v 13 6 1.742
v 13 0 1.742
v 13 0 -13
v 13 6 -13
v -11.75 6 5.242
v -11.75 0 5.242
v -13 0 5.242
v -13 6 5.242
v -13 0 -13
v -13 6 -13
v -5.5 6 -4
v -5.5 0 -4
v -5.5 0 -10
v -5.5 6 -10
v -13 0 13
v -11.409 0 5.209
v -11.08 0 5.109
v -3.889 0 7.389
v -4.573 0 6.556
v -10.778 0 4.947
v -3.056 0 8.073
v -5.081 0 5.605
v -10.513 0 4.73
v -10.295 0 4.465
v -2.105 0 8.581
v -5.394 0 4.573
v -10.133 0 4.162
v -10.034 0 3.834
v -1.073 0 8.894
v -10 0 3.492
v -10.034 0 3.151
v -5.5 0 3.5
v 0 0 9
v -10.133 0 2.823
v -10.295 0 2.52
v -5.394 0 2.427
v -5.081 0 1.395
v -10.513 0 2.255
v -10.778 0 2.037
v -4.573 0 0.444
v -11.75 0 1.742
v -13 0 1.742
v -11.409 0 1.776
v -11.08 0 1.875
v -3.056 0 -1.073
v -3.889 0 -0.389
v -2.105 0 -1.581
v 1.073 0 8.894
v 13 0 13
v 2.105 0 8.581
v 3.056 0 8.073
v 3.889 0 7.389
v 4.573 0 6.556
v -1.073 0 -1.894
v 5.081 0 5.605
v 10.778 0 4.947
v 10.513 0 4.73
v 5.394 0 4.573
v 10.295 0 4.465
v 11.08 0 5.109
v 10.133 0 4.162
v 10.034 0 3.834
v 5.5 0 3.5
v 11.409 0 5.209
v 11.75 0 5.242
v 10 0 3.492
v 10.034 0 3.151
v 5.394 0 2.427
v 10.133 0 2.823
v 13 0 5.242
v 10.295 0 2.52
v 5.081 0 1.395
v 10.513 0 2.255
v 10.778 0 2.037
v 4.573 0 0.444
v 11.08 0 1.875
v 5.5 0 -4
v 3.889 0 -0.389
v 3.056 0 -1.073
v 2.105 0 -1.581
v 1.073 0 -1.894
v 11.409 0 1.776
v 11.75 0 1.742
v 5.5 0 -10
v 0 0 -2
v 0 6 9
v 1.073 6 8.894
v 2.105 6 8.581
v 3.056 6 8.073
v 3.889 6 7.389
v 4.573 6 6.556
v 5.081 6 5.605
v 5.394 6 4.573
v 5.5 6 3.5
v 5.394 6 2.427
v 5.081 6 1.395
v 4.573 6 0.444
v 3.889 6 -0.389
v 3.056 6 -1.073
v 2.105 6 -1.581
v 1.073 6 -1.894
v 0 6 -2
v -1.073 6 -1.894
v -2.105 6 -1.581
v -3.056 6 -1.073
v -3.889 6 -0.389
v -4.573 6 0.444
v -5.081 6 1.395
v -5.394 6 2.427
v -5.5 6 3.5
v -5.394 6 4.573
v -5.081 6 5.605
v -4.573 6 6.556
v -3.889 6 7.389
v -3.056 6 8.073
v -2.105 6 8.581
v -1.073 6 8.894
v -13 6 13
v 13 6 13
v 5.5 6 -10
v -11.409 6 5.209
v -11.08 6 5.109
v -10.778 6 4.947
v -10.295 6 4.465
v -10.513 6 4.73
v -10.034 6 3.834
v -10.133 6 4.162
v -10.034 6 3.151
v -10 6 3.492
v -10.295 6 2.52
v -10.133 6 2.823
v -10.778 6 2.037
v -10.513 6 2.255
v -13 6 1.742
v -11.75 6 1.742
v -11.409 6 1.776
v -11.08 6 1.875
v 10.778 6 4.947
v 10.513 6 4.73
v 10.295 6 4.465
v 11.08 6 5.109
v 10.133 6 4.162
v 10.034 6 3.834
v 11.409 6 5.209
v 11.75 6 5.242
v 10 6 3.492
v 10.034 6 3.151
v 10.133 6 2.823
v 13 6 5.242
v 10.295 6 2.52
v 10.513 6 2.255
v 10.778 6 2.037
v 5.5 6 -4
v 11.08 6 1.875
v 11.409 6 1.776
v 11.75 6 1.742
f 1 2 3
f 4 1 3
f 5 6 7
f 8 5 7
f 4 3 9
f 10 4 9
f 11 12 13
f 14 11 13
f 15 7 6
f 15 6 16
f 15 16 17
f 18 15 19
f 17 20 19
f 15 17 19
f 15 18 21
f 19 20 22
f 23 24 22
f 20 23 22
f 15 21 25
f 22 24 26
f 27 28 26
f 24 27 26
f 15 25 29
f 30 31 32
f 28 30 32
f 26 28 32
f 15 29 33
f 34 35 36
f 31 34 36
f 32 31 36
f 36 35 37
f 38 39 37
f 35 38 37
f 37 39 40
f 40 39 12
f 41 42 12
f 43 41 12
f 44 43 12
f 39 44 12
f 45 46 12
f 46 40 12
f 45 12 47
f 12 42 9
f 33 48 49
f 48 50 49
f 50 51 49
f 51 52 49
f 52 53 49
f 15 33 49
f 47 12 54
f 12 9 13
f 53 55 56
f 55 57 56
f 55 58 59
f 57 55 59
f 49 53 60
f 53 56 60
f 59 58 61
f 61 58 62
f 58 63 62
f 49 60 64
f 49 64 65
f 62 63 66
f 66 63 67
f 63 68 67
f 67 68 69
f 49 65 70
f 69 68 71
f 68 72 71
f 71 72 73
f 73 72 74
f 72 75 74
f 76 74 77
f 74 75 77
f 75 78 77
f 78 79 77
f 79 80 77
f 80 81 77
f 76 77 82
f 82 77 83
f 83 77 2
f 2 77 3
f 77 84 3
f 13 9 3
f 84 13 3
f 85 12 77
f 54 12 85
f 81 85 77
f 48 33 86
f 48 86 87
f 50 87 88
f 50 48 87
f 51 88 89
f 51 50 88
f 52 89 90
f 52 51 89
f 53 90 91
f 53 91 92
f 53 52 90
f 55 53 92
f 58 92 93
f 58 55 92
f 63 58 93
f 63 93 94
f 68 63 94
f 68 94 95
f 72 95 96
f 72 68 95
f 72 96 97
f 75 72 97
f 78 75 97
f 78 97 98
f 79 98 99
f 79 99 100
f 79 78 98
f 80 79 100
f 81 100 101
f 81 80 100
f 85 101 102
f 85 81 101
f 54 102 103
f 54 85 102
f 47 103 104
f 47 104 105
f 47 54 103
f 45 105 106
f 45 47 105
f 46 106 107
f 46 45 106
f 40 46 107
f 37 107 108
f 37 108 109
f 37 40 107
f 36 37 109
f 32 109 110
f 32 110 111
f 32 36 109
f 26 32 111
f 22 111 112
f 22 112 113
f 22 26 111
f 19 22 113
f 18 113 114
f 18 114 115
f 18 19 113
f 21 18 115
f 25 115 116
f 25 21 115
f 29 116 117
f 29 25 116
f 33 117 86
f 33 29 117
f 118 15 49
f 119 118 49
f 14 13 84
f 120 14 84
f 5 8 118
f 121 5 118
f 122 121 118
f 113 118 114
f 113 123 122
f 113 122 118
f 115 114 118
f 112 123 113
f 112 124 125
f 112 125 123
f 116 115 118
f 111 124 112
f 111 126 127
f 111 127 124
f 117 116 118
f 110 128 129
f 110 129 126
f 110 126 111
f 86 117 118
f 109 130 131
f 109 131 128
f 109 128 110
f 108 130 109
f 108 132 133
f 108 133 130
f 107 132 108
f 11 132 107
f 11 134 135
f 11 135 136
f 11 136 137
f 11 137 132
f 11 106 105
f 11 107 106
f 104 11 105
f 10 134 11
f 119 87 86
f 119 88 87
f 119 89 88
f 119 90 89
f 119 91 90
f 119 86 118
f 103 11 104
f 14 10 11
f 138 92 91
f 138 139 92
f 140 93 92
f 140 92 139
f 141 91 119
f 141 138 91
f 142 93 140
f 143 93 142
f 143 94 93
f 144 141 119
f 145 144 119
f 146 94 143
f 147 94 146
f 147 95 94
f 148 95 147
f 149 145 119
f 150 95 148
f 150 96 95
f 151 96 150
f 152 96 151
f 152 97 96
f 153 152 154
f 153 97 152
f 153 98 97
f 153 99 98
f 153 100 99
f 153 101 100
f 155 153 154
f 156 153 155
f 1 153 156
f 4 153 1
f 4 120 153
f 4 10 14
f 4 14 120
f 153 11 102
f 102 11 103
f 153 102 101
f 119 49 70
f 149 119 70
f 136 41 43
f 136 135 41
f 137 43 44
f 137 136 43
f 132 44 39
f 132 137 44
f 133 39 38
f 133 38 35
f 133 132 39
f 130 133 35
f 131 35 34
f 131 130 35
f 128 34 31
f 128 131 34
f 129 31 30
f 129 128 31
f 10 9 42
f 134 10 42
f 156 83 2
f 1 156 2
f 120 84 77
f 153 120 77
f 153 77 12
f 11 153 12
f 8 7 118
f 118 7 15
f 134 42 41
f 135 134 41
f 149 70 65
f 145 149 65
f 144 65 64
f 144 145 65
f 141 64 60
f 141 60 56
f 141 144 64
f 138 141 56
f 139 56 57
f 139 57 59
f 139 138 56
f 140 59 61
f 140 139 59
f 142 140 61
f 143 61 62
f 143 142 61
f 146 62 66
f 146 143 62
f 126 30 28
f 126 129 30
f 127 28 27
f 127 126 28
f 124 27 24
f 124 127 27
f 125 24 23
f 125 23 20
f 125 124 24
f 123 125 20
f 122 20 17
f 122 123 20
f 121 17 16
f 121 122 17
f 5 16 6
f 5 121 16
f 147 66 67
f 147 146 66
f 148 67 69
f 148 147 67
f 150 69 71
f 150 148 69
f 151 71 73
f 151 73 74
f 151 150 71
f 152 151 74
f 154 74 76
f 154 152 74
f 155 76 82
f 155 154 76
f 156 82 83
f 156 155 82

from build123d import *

# Parameters (mm, degrees)
ESBO_O1_R                = 5.5
RESSALTO_EXTRUS_O1_DEPTH = 6
FILETE1_R                = 1.75


with BuildPart() as part:
    # Esboço1 → Ressalto-extrusão1 (new body)
    with BuildSketch(Plane(origin=(0, 0, 0), x_dir=(1, 0, 0), z_dir=(0, 1, 0))):
        Polygon((-13, -13), (13, -13), (13, -5.242288745), (10, -5.242288745), (10, -1.742288745), (13, -1.742288745), (13, 13), (-13, 13), (-13, -1.742288745), (-10, -1.742288745), (-10, -5.242288745), (-13, -5.242288745), align=None)
        with Locations(Location((0, -3.5, 0), (0, 0, 270))):
            Circle(ESBO_O1_R, mode=Mode.SUBTRACT)
        Polygon((-5.5, 10), (0, 10), (5.5, 10), (5.5, 4), (-5.5, 4), align=None, mode=Mode.SUBTRACT)
    extrude(amount=RESSALTO_EXTRUS_O1_DEPTH)

    # Filete1
    filete1_edges = [part.edges().sort_by_distance(p)[0] for p in [
        (10, 3, 1.742288745),
        (10, 3, 5.242288745),
        (-10, 3, 1.742288745),
        (-10, 3, 5.242288745),
    ]]
    fillet(filete1_edges, radius=FILETE1_R - 0.0001)  # a hair under: the kernel refuses the full size


solid = part.part
